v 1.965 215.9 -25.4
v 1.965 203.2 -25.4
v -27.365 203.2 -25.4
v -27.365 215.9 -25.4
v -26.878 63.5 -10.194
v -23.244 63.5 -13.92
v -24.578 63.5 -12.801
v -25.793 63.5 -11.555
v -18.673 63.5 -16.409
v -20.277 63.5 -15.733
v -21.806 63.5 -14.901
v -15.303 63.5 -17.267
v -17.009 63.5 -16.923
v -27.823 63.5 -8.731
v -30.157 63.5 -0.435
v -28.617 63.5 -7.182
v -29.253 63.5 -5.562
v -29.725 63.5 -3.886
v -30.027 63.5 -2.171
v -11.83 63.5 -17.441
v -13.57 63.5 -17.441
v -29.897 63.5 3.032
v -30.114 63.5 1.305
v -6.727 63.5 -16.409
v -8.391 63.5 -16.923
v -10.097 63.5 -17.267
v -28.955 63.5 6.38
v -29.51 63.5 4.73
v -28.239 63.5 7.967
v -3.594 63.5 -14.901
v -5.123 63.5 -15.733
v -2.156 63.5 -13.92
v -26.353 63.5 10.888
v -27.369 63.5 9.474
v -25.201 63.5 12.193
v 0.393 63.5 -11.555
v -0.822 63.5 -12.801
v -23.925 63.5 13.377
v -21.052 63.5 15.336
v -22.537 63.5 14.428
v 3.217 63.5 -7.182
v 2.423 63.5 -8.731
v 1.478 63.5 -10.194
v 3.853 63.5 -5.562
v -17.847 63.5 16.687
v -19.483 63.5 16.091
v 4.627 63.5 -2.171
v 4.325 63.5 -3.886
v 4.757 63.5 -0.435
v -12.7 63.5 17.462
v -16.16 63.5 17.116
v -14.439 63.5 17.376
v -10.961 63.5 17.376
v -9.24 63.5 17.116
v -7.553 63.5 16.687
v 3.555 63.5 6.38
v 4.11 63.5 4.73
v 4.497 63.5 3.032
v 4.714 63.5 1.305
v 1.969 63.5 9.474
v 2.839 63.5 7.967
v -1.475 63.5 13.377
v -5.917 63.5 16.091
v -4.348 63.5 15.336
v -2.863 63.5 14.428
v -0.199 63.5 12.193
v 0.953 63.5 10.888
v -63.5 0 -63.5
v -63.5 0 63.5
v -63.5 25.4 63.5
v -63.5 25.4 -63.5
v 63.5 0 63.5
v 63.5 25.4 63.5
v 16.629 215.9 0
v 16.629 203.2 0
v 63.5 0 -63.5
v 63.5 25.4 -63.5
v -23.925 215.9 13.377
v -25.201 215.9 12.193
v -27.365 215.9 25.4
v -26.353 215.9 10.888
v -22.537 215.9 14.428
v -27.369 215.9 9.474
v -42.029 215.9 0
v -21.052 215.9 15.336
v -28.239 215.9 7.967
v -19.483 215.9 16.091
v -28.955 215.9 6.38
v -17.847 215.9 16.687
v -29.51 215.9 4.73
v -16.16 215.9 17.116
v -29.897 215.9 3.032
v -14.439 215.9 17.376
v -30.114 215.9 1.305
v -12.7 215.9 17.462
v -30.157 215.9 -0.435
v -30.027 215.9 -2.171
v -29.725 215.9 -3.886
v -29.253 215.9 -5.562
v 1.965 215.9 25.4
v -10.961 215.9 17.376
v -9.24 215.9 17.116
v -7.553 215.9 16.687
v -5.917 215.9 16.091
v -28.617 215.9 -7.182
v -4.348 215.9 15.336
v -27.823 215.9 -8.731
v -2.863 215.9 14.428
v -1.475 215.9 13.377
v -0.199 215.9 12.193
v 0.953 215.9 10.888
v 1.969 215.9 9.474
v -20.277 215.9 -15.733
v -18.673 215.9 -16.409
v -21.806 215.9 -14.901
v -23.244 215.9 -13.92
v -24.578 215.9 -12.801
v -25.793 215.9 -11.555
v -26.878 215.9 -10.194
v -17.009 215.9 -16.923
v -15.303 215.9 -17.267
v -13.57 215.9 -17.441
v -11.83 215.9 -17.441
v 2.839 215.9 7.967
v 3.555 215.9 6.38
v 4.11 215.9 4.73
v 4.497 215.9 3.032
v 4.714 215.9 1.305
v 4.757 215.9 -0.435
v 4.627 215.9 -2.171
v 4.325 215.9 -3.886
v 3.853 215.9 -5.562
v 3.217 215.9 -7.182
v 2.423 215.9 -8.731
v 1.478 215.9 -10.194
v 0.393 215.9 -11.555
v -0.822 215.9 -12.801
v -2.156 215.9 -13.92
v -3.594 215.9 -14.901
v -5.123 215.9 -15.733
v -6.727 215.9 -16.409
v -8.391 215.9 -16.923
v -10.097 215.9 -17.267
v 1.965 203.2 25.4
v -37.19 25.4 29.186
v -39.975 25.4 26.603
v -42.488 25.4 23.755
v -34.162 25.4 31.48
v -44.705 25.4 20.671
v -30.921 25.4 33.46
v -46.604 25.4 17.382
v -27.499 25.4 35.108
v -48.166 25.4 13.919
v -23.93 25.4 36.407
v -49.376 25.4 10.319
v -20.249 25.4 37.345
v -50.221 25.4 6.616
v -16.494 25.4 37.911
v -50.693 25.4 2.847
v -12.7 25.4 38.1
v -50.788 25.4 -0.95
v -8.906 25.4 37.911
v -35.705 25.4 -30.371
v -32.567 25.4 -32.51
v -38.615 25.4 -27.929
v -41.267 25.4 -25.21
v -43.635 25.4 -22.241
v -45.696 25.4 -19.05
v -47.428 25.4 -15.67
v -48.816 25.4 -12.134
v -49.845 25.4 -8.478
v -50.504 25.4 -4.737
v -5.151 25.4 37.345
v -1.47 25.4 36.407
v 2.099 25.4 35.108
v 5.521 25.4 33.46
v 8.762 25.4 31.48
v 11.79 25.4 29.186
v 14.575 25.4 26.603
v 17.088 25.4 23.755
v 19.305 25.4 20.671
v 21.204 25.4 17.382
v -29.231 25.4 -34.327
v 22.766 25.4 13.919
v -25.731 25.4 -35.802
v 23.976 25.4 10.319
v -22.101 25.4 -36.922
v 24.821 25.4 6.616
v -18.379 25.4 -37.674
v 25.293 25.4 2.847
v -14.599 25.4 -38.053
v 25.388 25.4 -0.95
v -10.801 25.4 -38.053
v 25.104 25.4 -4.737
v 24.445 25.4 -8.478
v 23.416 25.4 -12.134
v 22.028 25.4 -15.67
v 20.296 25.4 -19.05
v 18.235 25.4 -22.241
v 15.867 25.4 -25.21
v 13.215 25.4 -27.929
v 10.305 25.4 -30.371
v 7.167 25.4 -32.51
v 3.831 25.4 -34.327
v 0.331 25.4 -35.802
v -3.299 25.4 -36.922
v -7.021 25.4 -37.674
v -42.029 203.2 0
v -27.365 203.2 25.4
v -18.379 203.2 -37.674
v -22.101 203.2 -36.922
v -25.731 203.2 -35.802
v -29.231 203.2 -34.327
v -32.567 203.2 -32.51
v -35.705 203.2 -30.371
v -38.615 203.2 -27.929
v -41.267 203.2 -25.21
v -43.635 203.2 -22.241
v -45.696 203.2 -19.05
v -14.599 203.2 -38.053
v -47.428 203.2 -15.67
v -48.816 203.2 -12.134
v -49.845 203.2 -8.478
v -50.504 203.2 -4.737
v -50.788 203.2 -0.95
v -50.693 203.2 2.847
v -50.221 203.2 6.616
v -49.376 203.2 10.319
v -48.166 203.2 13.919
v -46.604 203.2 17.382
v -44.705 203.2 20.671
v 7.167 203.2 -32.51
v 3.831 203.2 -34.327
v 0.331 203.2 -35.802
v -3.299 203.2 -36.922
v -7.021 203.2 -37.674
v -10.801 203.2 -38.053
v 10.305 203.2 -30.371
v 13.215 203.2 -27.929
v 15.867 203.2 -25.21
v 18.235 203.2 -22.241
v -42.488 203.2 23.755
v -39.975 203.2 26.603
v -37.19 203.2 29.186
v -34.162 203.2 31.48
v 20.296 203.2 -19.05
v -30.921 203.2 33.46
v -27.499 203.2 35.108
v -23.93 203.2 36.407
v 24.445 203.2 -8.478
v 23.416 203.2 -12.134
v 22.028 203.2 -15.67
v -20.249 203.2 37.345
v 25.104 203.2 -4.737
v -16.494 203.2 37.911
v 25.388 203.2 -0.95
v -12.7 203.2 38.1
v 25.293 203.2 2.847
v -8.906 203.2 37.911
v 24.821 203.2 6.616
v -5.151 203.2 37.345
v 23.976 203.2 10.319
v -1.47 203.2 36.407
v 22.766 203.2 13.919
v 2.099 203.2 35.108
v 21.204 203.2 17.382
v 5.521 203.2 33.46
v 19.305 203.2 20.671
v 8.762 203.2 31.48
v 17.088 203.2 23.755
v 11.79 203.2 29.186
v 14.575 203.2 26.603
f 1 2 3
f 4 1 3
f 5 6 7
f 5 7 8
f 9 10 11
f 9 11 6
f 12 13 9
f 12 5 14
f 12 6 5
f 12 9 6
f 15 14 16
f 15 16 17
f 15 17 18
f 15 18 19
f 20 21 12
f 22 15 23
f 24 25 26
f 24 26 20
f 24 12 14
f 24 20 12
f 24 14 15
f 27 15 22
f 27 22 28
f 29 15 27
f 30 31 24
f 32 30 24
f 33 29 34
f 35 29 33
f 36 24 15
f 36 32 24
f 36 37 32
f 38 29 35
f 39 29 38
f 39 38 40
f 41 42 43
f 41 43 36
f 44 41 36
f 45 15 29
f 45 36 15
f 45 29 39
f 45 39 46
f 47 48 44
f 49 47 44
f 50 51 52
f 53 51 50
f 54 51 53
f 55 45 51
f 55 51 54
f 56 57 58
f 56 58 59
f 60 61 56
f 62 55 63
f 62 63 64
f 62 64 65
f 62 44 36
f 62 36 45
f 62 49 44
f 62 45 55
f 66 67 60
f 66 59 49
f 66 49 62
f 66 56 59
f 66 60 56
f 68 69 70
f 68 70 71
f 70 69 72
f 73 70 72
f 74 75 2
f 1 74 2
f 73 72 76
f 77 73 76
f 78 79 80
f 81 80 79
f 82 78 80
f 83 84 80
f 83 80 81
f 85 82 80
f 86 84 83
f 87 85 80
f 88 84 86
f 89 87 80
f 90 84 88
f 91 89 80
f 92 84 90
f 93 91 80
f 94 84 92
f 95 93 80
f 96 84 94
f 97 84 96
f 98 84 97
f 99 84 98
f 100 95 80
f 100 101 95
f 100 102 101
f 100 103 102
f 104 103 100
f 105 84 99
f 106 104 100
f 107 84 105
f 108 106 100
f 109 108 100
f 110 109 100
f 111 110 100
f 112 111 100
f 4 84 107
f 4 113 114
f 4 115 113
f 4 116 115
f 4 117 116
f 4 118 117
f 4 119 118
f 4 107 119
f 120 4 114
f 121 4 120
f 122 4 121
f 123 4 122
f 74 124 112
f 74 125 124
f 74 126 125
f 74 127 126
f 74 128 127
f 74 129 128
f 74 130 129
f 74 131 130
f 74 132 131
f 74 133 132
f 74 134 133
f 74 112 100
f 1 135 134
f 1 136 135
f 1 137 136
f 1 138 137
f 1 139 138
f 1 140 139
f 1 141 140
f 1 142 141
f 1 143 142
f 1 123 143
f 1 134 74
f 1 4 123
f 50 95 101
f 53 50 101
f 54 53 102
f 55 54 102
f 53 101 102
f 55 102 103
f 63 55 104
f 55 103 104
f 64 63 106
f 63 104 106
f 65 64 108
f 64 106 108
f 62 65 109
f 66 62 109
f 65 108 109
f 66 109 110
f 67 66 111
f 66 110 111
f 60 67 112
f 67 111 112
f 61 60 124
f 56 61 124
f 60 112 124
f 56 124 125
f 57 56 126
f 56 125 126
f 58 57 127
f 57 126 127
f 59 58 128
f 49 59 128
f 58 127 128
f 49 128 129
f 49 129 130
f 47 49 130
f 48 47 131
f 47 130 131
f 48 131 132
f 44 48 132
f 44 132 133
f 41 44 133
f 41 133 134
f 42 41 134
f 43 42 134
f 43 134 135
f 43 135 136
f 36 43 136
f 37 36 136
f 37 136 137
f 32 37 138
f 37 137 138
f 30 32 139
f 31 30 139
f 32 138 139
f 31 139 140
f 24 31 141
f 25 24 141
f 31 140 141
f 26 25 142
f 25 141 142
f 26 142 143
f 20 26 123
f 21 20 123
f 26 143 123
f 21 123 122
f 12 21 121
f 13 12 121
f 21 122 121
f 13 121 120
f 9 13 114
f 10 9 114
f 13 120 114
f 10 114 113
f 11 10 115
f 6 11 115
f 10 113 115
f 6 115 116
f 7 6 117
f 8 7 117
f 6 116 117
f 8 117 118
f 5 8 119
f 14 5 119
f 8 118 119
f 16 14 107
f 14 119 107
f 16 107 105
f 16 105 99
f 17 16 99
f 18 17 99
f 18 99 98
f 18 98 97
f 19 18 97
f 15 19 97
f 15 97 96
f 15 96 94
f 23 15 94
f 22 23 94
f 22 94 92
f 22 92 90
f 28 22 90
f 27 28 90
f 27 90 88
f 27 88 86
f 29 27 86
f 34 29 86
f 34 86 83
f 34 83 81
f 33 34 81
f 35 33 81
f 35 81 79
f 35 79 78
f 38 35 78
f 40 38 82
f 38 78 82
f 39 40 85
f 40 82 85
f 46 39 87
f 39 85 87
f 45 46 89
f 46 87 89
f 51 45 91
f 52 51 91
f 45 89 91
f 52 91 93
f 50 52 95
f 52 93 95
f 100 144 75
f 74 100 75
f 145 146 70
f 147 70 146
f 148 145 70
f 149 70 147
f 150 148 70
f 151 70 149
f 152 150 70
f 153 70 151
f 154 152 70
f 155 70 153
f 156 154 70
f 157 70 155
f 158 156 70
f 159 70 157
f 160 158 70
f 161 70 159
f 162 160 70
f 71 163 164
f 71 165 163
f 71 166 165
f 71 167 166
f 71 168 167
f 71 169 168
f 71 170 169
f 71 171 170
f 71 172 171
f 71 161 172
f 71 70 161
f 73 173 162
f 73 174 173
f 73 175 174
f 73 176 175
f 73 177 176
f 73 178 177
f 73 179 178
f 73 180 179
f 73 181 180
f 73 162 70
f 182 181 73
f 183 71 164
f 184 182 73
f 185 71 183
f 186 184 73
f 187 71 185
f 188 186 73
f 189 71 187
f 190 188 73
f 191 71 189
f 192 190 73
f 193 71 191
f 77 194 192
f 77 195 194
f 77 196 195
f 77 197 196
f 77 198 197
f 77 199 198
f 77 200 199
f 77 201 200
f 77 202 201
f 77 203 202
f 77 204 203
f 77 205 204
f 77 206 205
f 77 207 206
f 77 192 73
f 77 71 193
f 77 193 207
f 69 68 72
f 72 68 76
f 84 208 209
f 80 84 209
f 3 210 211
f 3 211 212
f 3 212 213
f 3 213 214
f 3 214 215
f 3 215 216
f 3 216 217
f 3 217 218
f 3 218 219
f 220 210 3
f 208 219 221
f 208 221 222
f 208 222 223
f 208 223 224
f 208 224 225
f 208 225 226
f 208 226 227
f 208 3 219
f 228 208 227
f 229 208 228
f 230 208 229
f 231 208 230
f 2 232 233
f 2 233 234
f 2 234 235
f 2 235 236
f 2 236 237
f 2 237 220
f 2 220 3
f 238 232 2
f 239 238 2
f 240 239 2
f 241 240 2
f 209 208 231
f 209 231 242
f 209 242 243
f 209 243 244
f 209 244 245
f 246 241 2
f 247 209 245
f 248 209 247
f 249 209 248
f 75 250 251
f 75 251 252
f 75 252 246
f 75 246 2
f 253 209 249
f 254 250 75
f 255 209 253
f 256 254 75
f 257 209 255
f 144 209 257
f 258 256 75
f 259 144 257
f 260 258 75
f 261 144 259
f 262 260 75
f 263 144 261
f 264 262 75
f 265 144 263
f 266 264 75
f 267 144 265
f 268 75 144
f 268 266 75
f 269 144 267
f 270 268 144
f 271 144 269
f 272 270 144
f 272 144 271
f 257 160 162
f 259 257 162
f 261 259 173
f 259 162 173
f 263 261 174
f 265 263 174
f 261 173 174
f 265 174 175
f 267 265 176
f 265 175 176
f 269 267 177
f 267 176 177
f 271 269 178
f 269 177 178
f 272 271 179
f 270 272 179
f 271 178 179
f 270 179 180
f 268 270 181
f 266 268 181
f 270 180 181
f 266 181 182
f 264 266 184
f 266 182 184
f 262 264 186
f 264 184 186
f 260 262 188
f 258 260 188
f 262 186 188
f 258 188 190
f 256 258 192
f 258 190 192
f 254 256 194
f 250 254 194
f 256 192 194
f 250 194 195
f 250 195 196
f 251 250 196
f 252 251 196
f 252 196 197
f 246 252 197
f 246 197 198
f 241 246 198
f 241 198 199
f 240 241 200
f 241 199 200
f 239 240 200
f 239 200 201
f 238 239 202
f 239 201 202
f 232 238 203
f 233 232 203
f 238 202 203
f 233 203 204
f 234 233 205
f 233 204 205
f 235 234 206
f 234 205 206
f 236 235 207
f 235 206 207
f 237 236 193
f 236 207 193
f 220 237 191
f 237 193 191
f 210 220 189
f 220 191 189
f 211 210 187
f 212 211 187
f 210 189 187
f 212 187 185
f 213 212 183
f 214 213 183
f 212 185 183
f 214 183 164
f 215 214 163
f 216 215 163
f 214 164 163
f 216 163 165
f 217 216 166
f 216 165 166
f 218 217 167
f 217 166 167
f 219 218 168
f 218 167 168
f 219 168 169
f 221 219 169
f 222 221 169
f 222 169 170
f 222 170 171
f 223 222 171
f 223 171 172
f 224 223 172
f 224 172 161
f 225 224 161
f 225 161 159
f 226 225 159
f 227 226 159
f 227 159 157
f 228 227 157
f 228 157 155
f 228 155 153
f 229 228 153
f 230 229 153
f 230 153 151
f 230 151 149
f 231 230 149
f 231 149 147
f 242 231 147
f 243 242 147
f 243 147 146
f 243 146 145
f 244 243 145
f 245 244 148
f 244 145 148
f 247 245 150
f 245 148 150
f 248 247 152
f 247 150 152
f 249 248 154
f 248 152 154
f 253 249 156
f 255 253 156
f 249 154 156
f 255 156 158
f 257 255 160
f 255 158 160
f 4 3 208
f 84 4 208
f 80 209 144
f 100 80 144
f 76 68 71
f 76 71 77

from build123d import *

# Parameters (mm, degrees)
SKETCH1_W           = 127
SKETCH1_H           = 127
BOSS_EXTRUDE1_DEPTH = 25.4
SKETCH2_R           = 38.1
BOSS_EXTRUDE2_DEPTH = 177.8
BOSS_EXTRUDE3_DEPTH = 12.7
SKETCH4_R           = 17.4625
CUT_EXTRUDE1_DEPTH  = 152.4


with BuildPart() as part:
    # Sketch1 → Boss-Extrude1 (new body)
    with BuildSketch(Plane(origin=(0, 0, 0), x_dir=(1, 0, 0), z_dir=(0, 1, 0))):
        Rectangle(SKETCH1_W, SKETCH1_H)
    extrude(amount=BOSS_EXTRUDE1_DEPTH)

    # Sketch2 → Boss-Extrude2 (add)
    with BuildSketch(Plane(origin=(0, 25.4, 0), x_dir=(1, 0, 0), z_dir=(0, 1, 0))):
        with Locations(Location((-12.7, 0, 0), (0, 0, 270))):  # turned: the seam where the file's is
            Circle(SKETCH2_R)
    extrude(amount=BOSS_EXTRUDE2_DEPTH)

    # Sketch3 → Boss-Extrude3 (add)
    with BuildSketch(Plane(origin=(0, 203.2, 0), x_dir=(1, 0, 0), z_dir=(0, 1, 0))):
        Polygon((16.629393675, 0), (1.964696837, 25.4), (-27.364696837, 25.4), (-42.029393675, 0), (-27.364696837, -25.4), (1.964696837, -25.4), align=None)
    extrude(amount=BOSS_EXTRUDE3_DEPTH)

    # Sketch4 → Cut-Extrude1 (cut)
    with BuildSketch(Plane(origin=(0, 215.9, 0), x_dir=(1, 0, 0), z_dir=(0, 1, 0))):
        with Locations(Location((-12.7, 0, 0), (0, 0, 270))):  # turned: the seam where the file's is
            Circle(SKETCH4_R)
    extrude(amount=-CUT_EXTRUDE1_DEPTH, mode=Mode.SUBTRACT)


solid = part.part
